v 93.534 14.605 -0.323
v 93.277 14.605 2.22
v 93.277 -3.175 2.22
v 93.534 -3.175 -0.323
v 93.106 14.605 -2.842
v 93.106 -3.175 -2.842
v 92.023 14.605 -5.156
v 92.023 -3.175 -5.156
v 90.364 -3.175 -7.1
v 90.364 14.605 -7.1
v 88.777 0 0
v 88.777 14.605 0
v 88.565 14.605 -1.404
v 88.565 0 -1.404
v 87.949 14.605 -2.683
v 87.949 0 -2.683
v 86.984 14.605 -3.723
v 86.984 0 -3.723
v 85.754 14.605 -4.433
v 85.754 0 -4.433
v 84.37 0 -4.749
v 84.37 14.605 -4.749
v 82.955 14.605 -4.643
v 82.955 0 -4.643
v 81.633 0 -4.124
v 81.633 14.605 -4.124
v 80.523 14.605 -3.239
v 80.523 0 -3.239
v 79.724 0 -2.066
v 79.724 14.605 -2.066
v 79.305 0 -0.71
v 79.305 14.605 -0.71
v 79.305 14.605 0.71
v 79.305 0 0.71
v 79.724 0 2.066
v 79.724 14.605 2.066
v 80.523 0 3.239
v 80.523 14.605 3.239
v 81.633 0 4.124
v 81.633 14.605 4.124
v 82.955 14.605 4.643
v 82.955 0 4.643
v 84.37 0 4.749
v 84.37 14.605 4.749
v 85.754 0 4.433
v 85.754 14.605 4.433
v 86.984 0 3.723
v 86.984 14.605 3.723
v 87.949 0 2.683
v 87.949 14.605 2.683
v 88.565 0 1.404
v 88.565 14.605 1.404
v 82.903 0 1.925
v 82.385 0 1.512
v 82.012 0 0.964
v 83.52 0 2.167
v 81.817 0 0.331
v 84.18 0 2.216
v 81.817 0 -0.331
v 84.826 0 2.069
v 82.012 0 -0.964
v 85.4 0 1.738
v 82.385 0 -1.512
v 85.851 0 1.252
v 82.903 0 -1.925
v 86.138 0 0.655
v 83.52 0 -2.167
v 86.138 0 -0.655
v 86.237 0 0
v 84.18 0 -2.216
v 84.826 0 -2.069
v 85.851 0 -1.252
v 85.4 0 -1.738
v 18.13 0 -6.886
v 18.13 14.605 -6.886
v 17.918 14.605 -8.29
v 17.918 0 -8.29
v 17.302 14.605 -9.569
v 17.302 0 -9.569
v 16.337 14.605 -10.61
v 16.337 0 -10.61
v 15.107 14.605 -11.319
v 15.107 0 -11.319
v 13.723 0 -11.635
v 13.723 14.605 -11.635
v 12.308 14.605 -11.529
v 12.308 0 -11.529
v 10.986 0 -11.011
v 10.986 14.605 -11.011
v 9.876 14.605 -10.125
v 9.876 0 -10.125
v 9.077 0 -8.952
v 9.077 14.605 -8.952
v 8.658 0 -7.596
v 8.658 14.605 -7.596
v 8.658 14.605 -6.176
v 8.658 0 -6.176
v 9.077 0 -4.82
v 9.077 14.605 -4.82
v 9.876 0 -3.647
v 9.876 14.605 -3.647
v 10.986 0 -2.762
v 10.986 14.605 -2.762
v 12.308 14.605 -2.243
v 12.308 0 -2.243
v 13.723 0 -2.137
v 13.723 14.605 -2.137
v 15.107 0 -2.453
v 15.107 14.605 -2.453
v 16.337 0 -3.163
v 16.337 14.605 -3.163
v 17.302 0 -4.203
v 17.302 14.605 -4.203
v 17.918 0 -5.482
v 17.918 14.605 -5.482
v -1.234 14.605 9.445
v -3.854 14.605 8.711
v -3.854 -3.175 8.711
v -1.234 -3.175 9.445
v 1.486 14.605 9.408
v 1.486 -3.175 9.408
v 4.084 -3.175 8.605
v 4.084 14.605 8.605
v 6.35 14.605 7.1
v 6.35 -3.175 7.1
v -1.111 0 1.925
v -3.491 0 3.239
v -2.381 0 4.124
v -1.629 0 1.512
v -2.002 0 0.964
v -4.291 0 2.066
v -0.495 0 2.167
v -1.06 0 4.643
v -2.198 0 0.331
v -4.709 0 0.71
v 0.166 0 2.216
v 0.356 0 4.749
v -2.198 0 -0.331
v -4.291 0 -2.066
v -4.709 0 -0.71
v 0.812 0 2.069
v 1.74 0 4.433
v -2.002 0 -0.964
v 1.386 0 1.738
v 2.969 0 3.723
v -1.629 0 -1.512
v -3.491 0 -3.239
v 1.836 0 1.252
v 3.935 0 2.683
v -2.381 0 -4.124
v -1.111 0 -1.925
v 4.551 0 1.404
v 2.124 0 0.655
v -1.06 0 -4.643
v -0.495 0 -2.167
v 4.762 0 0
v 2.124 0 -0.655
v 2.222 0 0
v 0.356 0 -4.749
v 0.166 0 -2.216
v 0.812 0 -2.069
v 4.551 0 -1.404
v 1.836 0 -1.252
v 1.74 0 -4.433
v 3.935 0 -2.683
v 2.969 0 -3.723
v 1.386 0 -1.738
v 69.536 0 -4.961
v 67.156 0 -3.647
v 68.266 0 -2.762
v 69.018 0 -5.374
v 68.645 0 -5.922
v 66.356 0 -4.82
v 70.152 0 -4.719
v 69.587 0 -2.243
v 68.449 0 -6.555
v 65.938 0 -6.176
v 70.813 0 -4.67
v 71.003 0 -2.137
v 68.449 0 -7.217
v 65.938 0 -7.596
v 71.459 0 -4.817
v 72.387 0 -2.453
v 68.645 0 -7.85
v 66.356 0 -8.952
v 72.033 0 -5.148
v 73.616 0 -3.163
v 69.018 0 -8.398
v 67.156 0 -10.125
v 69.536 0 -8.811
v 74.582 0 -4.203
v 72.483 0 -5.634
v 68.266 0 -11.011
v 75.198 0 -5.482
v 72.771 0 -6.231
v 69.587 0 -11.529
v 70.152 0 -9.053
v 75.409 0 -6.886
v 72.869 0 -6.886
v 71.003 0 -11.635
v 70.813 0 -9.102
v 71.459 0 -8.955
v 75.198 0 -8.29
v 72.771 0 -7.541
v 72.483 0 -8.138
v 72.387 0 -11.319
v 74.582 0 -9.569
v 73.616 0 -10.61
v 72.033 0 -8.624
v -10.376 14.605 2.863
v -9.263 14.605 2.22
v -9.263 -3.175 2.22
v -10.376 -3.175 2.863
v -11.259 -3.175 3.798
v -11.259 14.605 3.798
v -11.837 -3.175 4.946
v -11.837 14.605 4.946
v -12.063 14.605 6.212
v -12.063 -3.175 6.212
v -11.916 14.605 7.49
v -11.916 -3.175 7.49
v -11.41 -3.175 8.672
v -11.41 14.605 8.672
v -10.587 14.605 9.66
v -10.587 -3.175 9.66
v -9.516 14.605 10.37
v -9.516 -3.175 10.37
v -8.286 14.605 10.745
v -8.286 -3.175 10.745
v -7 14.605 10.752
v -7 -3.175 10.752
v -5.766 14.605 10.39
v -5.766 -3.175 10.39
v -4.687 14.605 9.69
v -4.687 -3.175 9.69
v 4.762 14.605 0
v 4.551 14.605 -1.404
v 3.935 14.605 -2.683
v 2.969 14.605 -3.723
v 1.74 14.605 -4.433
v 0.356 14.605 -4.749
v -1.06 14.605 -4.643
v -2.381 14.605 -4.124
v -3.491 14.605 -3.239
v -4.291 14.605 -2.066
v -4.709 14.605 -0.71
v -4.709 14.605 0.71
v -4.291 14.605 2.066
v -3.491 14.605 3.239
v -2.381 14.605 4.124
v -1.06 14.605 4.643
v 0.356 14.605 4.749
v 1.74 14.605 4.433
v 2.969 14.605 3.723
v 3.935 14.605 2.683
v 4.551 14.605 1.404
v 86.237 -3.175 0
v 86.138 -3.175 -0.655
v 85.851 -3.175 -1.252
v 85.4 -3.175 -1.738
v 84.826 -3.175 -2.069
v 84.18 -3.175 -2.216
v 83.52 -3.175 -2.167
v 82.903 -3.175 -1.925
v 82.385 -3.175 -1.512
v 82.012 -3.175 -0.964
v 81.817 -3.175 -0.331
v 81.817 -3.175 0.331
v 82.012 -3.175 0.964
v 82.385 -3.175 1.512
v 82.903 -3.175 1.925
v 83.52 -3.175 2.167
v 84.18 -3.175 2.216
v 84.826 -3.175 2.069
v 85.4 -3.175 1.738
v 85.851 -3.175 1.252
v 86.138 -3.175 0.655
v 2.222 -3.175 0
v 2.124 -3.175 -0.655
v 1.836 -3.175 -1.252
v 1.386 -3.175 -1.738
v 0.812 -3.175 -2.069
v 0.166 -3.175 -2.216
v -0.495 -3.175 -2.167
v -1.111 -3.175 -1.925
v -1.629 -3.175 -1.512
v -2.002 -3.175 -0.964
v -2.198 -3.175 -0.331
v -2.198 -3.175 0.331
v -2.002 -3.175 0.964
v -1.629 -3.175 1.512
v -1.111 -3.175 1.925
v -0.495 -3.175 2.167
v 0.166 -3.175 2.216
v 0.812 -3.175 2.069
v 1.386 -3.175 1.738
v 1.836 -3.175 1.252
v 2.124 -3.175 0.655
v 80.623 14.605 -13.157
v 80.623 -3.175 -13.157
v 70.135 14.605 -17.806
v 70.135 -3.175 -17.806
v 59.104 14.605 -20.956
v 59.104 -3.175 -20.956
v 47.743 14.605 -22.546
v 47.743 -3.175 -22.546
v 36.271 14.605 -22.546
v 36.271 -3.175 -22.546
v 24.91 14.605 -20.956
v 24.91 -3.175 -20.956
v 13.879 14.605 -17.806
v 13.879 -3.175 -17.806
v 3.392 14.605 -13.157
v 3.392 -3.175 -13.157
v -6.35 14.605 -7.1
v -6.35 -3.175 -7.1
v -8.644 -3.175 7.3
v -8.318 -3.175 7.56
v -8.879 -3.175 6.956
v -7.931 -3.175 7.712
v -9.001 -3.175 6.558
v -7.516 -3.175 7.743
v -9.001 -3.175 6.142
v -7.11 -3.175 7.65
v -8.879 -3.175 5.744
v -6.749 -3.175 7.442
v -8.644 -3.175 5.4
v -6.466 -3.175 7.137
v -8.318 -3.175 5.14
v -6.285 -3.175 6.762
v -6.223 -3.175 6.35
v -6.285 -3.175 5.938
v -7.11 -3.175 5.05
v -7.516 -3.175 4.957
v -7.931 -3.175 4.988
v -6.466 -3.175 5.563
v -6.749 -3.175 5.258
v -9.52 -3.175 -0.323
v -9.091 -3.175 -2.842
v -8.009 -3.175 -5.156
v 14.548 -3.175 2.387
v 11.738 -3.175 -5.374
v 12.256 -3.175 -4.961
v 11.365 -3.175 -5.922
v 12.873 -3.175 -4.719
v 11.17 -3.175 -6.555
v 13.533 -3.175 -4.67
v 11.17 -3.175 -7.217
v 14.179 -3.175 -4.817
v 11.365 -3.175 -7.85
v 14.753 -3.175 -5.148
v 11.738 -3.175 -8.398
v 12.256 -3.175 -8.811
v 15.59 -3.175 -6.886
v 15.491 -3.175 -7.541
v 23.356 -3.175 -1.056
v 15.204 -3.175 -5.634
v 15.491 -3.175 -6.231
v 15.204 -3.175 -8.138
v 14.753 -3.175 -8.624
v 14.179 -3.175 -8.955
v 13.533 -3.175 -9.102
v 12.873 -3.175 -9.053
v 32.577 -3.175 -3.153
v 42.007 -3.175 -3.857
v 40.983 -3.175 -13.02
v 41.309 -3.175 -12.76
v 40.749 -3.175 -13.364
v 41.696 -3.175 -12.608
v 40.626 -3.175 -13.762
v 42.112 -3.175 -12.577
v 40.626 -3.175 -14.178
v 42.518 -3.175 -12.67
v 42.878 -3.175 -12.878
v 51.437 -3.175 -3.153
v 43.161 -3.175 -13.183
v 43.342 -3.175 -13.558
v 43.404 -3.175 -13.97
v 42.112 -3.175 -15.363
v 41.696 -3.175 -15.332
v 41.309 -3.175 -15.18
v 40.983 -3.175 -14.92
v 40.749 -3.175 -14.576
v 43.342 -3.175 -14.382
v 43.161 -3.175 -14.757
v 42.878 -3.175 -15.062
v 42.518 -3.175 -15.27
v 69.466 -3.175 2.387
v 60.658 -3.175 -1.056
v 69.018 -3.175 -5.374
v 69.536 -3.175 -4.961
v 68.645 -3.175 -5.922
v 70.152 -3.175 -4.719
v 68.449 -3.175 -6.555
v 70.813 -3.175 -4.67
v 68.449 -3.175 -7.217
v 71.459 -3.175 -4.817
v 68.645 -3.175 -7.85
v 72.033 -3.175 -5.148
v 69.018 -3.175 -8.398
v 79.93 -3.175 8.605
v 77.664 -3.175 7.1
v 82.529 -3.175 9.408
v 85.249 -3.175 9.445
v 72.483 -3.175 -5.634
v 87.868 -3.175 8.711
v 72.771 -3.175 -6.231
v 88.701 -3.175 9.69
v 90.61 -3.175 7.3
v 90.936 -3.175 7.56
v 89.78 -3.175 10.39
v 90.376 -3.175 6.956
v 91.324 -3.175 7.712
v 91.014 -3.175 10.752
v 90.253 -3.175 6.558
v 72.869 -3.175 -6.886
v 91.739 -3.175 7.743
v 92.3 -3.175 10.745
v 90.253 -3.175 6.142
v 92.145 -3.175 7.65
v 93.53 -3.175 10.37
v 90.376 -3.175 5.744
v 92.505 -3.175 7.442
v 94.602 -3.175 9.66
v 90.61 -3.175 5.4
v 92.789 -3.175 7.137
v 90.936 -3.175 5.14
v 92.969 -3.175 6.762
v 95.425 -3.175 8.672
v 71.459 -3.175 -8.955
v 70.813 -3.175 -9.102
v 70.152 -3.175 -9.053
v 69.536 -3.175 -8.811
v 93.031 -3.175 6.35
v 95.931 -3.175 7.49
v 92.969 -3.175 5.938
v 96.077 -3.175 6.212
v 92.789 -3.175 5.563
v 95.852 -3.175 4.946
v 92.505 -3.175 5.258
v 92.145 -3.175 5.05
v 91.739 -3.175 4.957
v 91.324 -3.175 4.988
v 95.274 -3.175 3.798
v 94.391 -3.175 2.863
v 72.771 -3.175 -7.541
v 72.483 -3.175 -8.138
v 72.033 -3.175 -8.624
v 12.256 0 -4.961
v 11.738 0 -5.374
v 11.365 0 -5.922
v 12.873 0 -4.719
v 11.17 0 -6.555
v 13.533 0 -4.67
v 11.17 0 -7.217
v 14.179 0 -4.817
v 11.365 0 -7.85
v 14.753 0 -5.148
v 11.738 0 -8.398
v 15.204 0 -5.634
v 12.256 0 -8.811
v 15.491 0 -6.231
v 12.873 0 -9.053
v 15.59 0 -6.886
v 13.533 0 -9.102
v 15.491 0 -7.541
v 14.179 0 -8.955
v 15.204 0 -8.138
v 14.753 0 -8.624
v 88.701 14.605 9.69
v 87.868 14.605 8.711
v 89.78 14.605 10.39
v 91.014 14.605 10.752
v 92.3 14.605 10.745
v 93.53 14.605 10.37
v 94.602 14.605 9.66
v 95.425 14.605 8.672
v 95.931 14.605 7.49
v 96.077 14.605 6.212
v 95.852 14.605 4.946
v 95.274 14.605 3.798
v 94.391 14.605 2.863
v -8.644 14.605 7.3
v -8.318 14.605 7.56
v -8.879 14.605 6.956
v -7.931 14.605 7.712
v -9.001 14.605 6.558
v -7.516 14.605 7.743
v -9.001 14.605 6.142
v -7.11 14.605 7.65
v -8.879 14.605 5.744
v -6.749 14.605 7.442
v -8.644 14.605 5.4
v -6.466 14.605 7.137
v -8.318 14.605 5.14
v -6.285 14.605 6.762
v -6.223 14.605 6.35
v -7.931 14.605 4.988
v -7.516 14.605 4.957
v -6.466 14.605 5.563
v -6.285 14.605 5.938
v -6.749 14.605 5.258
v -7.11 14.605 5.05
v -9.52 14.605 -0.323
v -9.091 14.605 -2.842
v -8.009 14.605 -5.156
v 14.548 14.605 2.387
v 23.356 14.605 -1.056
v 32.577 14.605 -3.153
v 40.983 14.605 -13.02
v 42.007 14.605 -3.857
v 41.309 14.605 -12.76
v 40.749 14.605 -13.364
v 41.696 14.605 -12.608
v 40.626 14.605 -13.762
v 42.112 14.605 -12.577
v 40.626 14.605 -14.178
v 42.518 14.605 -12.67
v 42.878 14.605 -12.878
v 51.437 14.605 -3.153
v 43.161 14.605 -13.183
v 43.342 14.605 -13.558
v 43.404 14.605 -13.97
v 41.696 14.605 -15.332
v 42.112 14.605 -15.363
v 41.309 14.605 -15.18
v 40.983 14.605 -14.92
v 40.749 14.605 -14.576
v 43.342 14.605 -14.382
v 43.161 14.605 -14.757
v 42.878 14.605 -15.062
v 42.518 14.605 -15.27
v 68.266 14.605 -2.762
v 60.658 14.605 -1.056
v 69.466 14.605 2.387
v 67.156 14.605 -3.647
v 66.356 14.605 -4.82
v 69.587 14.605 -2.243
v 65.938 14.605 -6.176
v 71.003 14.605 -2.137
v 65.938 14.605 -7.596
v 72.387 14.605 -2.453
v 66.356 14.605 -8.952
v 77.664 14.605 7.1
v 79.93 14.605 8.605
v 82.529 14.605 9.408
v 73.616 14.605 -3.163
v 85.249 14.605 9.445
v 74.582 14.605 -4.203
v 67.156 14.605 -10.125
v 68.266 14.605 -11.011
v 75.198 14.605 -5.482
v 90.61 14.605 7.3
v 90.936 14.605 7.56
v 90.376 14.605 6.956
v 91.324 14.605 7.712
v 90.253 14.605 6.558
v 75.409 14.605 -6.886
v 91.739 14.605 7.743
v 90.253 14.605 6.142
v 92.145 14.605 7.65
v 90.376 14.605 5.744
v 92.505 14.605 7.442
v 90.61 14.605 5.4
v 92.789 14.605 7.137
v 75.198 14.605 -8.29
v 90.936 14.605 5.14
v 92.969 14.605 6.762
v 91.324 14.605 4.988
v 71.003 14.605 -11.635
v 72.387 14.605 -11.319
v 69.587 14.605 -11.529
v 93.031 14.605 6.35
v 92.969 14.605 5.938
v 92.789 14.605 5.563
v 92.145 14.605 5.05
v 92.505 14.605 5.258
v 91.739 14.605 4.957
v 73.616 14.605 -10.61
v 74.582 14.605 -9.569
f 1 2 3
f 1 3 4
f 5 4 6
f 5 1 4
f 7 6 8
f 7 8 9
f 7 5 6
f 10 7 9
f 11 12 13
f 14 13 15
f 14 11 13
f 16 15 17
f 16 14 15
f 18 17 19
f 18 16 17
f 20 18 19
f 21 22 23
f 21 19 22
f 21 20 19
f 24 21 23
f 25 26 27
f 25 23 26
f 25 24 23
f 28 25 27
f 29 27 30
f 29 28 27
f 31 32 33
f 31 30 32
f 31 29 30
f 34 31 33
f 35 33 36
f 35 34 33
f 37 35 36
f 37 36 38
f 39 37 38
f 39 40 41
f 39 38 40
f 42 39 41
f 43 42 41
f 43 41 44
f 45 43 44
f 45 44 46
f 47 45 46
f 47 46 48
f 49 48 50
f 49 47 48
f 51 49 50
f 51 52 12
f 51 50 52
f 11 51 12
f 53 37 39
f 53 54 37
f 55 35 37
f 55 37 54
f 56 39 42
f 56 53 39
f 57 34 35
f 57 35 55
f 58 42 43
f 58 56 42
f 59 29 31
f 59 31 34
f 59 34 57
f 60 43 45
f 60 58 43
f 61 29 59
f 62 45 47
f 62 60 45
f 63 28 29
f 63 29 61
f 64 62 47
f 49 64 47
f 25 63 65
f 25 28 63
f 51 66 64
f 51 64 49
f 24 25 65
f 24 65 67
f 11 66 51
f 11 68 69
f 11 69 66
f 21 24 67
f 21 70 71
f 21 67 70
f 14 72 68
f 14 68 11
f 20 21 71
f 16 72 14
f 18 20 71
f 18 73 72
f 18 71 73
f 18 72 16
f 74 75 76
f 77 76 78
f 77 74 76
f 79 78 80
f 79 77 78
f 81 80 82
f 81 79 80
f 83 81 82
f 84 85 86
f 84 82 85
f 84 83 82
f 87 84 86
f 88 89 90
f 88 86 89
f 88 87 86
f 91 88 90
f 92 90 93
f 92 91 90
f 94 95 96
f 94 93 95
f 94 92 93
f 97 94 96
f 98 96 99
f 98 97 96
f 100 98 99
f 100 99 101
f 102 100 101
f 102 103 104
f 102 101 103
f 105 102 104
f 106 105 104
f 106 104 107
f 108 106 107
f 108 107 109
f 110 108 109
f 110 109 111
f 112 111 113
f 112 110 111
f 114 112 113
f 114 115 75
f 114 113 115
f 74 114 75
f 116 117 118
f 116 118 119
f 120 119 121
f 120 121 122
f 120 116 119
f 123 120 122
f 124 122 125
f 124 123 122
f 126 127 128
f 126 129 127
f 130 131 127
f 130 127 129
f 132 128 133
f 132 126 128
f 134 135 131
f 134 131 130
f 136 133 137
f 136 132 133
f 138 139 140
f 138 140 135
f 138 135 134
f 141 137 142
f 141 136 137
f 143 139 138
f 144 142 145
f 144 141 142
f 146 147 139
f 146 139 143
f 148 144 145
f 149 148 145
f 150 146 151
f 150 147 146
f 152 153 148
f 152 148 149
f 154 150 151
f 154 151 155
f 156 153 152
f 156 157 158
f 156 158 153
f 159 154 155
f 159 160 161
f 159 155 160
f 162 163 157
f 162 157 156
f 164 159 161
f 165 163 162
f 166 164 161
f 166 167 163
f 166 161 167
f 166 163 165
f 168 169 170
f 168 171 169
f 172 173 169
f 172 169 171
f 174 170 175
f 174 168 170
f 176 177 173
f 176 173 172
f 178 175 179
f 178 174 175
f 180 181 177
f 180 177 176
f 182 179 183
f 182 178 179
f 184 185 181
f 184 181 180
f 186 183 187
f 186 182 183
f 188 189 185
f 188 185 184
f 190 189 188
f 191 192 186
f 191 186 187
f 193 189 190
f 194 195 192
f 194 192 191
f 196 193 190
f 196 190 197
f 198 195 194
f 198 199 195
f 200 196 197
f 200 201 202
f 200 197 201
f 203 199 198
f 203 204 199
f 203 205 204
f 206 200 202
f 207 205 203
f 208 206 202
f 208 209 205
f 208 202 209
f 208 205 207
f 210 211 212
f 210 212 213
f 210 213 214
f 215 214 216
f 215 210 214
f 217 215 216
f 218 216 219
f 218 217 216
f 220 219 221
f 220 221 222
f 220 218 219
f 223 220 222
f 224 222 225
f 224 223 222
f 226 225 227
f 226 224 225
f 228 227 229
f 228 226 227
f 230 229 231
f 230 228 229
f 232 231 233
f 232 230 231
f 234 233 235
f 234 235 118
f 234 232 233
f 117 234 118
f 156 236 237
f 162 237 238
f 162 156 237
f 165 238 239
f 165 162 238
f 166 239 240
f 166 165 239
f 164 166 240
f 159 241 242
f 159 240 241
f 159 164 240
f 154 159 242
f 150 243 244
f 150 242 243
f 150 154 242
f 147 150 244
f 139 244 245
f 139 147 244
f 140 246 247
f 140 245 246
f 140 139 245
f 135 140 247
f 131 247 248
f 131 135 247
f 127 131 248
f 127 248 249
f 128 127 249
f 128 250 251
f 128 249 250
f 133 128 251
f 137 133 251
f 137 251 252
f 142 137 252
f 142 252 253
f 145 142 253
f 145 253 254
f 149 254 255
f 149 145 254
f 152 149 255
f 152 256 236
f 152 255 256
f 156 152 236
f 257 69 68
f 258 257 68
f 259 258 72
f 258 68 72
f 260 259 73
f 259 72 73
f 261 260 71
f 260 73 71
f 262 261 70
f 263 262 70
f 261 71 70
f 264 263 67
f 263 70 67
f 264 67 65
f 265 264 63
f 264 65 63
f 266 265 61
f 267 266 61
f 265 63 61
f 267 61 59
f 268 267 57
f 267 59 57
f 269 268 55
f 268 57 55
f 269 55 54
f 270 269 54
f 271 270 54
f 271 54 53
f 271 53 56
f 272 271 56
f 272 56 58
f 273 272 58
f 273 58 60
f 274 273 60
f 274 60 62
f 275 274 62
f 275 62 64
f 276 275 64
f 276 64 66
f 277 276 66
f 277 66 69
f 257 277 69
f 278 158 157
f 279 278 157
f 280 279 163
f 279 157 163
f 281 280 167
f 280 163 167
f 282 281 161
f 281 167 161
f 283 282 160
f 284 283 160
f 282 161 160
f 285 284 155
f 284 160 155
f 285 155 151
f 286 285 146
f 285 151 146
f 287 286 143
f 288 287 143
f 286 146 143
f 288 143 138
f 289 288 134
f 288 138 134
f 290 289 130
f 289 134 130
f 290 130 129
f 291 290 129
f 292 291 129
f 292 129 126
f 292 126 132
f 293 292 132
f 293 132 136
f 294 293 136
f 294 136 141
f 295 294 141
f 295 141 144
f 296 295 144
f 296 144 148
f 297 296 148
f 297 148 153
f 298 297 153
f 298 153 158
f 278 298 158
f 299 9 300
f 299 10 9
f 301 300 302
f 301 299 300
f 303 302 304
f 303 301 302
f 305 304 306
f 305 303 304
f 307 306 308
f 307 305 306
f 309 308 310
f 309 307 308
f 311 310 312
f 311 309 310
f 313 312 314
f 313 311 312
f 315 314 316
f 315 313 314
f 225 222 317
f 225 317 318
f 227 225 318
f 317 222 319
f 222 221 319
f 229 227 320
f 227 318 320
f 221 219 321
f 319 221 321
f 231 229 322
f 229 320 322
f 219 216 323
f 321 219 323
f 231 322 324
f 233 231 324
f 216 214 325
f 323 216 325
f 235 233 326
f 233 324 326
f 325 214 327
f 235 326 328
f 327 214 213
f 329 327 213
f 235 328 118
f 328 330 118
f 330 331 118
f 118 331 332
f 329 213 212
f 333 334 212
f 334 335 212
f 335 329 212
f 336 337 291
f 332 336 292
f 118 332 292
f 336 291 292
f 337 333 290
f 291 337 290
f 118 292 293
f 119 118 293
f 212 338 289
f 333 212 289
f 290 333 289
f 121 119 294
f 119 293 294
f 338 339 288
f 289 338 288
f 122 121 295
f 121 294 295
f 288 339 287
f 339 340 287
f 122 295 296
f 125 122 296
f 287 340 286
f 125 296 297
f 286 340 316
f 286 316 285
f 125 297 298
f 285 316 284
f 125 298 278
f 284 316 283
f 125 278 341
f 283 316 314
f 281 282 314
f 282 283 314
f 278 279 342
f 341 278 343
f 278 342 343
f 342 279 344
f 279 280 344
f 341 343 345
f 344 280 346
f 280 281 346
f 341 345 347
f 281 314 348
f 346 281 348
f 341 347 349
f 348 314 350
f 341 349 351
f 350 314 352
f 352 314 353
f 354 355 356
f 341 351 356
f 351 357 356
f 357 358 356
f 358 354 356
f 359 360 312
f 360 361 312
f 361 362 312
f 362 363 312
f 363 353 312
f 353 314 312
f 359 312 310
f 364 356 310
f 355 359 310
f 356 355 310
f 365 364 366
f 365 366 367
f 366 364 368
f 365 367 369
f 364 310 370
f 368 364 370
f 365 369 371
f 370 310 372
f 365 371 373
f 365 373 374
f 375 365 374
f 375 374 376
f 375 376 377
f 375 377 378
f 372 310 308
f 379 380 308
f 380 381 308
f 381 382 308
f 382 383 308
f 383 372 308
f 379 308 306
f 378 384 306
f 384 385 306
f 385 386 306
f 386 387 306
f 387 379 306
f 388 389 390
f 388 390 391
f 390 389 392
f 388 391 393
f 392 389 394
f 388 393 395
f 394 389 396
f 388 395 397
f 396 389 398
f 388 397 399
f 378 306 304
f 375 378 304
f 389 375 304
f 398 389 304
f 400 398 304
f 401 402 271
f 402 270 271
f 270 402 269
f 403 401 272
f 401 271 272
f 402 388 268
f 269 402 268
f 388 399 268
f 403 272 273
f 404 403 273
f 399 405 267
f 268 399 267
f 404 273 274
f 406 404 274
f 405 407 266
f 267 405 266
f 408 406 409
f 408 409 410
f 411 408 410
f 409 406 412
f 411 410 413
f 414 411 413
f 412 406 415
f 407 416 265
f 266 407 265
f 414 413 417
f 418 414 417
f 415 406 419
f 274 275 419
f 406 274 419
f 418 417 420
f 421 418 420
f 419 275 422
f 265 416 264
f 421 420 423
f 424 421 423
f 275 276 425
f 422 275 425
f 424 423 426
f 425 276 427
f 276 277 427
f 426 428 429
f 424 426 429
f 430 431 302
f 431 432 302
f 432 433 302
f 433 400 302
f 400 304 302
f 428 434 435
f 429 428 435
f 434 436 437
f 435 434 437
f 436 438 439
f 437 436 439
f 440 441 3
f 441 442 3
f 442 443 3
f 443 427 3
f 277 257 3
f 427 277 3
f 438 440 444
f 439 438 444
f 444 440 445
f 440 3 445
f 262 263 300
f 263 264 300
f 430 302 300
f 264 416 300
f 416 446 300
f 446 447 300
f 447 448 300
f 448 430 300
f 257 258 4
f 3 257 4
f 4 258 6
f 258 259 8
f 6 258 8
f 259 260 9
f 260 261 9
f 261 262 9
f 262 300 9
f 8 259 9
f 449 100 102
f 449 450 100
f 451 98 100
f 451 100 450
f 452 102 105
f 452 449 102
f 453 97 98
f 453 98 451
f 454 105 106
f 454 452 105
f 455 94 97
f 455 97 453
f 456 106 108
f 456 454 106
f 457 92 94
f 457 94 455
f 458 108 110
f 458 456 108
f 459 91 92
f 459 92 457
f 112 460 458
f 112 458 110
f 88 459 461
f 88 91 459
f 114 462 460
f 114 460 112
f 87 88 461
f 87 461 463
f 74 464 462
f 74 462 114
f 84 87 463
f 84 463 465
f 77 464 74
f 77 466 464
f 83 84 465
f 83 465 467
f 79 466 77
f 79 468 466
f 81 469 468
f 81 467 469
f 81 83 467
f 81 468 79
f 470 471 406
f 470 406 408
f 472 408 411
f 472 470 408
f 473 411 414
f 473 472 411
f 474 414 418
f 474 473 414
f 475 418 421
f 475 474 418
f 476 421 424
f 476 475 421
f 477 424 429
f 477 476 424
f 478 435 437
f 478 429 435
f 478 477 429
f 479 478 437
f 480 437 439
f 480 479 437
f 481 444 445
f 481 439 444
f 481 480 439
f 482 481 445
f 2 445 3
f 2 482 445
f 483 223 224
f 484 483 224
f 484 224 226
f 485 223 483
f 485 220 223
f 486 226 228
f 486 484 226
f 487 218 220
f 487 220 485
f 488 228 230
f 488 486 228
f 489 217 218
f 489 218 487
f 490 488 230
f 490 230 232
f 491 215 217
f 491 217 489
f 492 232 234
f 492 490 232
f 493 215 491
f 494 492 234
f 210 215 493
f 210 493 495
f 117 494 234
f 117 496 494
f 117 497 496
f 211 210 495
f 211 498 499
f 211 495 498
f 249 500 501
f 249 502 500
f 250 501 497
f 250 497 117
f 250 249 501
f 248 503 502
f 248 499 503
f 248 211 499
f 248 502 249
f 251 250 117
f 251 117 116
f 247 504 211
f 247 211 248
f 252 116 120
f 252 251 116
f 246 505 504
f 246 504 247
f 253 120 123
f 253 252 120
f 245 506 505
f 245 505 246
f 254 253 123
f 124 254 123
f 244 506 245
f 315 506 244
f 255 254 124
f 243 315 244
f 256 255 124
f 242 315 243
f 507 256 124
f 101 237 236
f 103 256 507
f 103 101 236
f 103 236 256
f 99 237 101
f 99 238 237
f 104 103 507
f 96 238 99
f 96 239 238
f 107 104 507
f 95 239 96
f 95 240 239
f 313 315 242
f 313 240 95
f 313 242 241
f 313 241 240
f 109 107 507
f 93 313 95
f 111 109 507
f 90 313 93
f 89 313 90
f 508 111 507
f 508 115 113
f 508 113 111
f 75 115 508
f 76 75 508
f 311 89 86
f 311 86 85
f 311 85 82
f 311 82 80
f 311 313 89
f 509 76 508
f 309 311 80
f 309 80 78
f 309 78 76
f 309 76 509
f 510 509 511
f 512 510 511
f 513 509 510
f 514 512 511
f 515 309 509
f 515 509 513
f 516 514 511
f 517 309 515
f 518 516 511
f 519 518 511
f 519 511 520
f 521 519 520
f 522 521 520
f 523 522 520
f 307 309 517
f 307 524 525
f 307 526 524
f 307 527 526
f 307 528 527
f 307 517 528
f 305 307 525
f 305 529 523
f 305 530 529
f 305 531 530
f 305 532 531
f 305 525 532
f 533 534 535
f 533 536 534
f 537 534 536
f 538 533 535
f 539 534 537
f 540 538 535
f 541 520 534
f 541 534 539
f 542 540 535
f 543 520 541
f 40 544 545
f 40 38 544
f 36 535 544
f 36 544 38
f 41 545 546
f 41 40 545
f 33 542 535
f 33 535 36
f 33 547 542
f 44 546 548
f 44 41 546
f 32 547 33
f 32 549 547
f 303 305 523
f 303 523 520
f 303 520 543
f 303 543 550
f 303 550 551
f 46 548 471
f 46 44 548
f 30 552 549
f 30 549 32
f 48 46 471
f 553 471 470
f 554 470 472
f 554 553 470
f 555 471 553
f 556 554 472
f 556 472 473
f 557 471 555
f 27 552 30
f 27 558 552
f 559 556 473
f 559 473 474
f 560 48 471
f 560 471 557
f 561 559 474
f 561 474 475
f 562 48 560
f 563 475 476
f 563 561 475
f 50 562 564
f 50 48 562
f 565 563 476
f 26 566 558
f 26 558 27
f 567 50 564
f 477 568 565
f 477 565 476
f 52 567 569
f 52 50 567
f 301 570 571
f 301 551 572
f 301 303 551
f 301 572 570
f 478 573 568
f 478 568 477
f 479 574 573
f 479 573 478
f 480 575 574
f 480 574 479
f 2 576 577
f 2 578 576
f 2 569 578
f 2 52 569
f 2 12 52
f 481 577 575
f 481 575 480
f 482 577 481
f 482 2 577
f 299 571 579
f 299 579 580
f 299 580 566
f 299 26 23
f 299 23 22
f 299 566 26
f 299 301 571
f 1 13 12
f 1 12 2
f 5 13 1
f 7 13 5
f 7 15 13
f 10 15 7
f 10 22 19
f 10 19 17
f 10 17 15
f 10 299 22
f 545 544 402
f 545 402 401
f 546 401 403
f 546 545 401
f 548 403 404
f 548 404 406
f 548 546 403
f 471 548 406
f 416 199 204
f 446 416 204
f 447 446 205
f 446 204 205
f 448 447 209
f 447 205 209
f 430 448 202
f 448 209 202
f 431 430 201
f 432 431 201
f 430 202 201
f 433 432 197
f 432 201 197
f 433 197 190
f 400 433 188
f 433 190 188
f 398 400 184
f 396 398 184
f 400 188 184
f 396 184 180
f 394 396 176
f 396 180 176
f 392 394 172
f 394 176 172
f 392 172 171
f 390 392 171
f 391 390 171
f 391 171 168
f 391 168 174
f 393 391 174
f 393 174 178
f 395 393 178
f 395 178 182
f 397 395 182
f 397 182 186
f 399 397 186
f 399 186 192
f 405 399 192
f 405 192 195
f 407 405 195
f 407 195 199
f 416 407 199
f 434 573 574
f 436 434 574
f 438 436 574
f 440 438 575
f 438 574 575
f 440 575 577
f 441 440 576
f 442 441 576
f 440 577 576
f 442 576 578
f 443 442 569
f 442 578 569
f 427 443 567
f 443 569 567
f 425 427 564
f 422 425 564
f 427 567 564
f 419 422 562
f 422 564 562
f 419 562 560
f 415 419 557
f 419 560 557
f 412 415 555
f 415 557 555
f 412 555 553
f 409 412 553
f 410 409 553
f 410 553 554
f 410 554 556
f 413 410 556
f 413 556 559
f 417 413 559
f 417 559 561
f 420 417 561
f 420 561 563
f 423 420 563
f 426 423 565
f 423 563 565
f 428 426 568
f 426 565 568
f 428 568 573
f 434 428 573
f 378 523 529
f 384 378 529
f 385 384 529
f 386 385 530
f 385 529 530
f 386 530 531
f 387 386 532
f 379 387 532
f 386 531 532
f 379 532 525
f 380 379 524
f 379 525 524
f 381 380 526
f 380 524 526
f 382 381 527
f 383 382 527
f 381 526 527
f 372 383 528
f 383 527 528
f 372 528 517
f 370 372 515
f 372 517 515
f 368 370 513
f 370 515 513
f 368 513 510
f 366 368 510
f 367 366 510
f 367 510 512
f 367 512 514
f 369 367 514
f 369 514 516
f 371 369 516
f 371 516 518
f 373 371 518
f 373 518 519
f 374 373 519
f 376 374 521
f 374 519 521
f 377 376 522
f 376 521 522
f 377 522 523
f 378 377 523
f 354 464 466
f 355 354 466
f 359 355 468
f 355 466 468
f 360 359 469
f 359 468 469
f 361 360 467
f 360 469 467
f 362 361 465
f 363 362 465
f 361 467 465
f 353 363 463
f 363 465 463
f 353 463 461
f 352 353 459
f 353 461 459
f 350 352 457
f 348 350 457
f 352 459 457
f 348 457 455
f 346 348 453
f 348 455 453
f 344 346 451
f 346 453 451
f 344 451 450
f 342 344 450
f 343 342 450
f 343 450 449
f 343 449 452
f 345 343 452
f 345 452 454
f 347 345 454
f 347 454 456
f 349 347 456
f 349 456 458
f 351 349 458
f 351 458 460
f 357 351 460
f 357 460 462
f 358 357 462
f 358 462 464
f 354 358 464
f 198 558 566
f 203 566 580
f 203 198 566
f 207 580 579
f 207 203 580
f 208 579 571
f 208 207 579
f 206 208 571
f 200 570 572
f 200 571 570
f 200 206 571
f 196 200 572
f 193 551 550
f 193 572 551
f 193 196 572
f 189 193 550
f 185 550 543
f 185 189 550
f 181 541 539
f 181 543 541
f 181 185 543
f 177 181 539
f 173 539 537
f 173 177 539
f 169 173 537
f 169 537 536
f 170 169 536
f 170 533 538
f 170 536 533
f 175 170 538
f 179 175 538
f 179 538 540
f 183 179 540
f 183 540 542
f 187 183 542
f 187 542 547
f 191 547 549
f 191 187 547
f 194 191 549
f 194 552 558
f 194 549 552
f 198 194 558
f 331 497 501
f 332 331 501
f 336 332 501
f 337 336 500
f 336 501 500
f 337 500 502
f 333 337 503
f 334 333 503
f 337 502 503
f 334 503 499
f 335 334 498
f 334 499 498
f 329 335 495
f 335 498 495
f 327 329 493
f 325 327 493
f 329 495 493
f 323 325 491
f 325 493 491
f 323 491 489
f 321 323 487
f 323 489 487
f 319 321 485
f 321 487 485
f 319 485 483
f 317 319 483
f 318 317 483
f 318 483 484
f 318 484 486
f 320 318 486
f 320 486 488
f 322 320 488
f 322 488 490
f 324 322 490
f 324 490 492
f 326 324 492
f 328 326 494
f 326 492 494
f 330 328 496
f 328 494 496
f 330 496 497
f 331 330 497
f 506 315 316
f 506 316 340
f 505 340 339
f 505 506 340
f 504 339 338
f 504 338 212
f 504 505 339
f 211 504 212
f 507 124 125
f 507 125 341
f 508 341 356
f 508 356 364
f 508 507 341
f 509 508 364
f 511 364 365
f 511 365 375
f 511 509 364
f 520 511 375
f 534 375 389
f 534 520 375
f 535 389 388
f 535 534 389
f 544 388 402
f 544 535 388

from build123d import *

# Parameters (mm, degrees)
BOSS_EXTRUDE1_DEPTH      = 14.605
BOSS_EXTRUDE1_DEPTH_BACK = 3.175
SKETCH1_R                = 4.7625
CUT_EXTRUDE1_DEPTH       = 20.32
SKETCH4_R                = 2.2225
CUT_EXTRUDE2_DEPTH       = 20.32
SKETCH5_R                = 4.445
BOSS_EXTRUDE2_DEPTH      = 17.78
SKETCH6_R                = 1.397
CUT_EXTRUDE3_DEPTH       = 17.78


with BuildPart() as part:
    # Sketch2 → Boss-Extrude1 (new body, two sides)
    with BuildSketch(Plane(origin=(0, 0, 0), x_dir=(1, 0, 0), z_dir=(0, 1, 0))) as boss_extrude1_sk:
        with BuildLine():
            ThreePointArc((-6.35, 7.099515829), (-7.099515829, -6.35), (6.35, -7.099515829))
            ThreePointArc((6.35, -7.099515829), (42.007194804, 3.857031119), (77.664389608, -7.099515829))
            ThreePointArc((77.664389608, -7.099515829), (91.113905436, -6.35), (90.364389608, 7.099515829))
            ThreePointArc((90.364389608, 7.099515829), (42.007194804, 22.745971747), (-6.35, 7.099515829))
        make_face()
    extrude(amount=BOSS_EXTRUDE1_DEPTH)
    extrude(boss_extrude1_sk.sketch, amount=-BOSS_EXTRUDE1_DEPTH_BACK)

    # Sketch1 → Cut-Extrude1 (cut)
    with BuildSketch(Plane(origin=(0, 0, 0), x_dir=(1, 0, 0), z_dir=(0, 1, 0))):
        Circle(SKETCH1_R)
        with Locations((13.367402776, 6.886065441)):
            Circle(SKETCH1_R)
        with Locations((70.646986832, 6.886065441)):
            Circle(SKETCH1_R)
        with Locations((84.014389608, 0)):
            Circle(SKETCH1_R)
    extrude(amount=CUT_EXTRUDE1_DEPTH, mode=Mode.SUBTRACT)

    # Sketch4 → Cut-Extrude2 (cut)
    with BuildSketch(Plane(origin=(0, 0, 0), x_dir=(1, 0, 0), z_dir=(0, 1, 0))):
        with Locations((13.367402776, 6.886065441)):
            Circle(SKETCH4_R)
        Circle(SKETCH4_R)
        with Locations((70.646986832, 6.886065441)):
            Circle(SKETCH4_R)
        with Locations((84.014389608, 0)):
            Circle(SKETCH4_R)
    extrude(amount=-CUT_EXTRUDE2_DEPTH, mode=Mode.SUBTRACT)

    # Sketch5 → Boss-Extrude2 (add)
    with BuildSketch(Plane(origin=(0, 14.605, 0), x_dir=(1, 0, 0), z_dir=(0, 1, 0))):
        with Locations((-7.62, -6.35)):
            Circle(SKETCH5_R)
        with Locations((91.634389608, -6.35)):
            Circle(SKETCH5_R)
    extrude(amount=-BOSS_EXTRUDE2_DEPTH)

    # Sketch6 → Cut-Extrude3 (cut)
    with BuildSketch(Plane(origin=(0, 14.605, 0), x_dir=(1, 0, 0), z_dir=(0, 1, 0))):
        with Locations((42.007194804, 13.97)):
            Circle(SKETCH6_R)
        with Locations((-7.62, -6.35)):
            Circle(SKETCH6_R)
        with Locations((91.634389608, -6.35)):
            Circle(SKETCH6_R)
    extrude(amount=-CUT_EXTRUDE3_DEPTH, mode=Mode.SUBTRACT)


solid = part.part
